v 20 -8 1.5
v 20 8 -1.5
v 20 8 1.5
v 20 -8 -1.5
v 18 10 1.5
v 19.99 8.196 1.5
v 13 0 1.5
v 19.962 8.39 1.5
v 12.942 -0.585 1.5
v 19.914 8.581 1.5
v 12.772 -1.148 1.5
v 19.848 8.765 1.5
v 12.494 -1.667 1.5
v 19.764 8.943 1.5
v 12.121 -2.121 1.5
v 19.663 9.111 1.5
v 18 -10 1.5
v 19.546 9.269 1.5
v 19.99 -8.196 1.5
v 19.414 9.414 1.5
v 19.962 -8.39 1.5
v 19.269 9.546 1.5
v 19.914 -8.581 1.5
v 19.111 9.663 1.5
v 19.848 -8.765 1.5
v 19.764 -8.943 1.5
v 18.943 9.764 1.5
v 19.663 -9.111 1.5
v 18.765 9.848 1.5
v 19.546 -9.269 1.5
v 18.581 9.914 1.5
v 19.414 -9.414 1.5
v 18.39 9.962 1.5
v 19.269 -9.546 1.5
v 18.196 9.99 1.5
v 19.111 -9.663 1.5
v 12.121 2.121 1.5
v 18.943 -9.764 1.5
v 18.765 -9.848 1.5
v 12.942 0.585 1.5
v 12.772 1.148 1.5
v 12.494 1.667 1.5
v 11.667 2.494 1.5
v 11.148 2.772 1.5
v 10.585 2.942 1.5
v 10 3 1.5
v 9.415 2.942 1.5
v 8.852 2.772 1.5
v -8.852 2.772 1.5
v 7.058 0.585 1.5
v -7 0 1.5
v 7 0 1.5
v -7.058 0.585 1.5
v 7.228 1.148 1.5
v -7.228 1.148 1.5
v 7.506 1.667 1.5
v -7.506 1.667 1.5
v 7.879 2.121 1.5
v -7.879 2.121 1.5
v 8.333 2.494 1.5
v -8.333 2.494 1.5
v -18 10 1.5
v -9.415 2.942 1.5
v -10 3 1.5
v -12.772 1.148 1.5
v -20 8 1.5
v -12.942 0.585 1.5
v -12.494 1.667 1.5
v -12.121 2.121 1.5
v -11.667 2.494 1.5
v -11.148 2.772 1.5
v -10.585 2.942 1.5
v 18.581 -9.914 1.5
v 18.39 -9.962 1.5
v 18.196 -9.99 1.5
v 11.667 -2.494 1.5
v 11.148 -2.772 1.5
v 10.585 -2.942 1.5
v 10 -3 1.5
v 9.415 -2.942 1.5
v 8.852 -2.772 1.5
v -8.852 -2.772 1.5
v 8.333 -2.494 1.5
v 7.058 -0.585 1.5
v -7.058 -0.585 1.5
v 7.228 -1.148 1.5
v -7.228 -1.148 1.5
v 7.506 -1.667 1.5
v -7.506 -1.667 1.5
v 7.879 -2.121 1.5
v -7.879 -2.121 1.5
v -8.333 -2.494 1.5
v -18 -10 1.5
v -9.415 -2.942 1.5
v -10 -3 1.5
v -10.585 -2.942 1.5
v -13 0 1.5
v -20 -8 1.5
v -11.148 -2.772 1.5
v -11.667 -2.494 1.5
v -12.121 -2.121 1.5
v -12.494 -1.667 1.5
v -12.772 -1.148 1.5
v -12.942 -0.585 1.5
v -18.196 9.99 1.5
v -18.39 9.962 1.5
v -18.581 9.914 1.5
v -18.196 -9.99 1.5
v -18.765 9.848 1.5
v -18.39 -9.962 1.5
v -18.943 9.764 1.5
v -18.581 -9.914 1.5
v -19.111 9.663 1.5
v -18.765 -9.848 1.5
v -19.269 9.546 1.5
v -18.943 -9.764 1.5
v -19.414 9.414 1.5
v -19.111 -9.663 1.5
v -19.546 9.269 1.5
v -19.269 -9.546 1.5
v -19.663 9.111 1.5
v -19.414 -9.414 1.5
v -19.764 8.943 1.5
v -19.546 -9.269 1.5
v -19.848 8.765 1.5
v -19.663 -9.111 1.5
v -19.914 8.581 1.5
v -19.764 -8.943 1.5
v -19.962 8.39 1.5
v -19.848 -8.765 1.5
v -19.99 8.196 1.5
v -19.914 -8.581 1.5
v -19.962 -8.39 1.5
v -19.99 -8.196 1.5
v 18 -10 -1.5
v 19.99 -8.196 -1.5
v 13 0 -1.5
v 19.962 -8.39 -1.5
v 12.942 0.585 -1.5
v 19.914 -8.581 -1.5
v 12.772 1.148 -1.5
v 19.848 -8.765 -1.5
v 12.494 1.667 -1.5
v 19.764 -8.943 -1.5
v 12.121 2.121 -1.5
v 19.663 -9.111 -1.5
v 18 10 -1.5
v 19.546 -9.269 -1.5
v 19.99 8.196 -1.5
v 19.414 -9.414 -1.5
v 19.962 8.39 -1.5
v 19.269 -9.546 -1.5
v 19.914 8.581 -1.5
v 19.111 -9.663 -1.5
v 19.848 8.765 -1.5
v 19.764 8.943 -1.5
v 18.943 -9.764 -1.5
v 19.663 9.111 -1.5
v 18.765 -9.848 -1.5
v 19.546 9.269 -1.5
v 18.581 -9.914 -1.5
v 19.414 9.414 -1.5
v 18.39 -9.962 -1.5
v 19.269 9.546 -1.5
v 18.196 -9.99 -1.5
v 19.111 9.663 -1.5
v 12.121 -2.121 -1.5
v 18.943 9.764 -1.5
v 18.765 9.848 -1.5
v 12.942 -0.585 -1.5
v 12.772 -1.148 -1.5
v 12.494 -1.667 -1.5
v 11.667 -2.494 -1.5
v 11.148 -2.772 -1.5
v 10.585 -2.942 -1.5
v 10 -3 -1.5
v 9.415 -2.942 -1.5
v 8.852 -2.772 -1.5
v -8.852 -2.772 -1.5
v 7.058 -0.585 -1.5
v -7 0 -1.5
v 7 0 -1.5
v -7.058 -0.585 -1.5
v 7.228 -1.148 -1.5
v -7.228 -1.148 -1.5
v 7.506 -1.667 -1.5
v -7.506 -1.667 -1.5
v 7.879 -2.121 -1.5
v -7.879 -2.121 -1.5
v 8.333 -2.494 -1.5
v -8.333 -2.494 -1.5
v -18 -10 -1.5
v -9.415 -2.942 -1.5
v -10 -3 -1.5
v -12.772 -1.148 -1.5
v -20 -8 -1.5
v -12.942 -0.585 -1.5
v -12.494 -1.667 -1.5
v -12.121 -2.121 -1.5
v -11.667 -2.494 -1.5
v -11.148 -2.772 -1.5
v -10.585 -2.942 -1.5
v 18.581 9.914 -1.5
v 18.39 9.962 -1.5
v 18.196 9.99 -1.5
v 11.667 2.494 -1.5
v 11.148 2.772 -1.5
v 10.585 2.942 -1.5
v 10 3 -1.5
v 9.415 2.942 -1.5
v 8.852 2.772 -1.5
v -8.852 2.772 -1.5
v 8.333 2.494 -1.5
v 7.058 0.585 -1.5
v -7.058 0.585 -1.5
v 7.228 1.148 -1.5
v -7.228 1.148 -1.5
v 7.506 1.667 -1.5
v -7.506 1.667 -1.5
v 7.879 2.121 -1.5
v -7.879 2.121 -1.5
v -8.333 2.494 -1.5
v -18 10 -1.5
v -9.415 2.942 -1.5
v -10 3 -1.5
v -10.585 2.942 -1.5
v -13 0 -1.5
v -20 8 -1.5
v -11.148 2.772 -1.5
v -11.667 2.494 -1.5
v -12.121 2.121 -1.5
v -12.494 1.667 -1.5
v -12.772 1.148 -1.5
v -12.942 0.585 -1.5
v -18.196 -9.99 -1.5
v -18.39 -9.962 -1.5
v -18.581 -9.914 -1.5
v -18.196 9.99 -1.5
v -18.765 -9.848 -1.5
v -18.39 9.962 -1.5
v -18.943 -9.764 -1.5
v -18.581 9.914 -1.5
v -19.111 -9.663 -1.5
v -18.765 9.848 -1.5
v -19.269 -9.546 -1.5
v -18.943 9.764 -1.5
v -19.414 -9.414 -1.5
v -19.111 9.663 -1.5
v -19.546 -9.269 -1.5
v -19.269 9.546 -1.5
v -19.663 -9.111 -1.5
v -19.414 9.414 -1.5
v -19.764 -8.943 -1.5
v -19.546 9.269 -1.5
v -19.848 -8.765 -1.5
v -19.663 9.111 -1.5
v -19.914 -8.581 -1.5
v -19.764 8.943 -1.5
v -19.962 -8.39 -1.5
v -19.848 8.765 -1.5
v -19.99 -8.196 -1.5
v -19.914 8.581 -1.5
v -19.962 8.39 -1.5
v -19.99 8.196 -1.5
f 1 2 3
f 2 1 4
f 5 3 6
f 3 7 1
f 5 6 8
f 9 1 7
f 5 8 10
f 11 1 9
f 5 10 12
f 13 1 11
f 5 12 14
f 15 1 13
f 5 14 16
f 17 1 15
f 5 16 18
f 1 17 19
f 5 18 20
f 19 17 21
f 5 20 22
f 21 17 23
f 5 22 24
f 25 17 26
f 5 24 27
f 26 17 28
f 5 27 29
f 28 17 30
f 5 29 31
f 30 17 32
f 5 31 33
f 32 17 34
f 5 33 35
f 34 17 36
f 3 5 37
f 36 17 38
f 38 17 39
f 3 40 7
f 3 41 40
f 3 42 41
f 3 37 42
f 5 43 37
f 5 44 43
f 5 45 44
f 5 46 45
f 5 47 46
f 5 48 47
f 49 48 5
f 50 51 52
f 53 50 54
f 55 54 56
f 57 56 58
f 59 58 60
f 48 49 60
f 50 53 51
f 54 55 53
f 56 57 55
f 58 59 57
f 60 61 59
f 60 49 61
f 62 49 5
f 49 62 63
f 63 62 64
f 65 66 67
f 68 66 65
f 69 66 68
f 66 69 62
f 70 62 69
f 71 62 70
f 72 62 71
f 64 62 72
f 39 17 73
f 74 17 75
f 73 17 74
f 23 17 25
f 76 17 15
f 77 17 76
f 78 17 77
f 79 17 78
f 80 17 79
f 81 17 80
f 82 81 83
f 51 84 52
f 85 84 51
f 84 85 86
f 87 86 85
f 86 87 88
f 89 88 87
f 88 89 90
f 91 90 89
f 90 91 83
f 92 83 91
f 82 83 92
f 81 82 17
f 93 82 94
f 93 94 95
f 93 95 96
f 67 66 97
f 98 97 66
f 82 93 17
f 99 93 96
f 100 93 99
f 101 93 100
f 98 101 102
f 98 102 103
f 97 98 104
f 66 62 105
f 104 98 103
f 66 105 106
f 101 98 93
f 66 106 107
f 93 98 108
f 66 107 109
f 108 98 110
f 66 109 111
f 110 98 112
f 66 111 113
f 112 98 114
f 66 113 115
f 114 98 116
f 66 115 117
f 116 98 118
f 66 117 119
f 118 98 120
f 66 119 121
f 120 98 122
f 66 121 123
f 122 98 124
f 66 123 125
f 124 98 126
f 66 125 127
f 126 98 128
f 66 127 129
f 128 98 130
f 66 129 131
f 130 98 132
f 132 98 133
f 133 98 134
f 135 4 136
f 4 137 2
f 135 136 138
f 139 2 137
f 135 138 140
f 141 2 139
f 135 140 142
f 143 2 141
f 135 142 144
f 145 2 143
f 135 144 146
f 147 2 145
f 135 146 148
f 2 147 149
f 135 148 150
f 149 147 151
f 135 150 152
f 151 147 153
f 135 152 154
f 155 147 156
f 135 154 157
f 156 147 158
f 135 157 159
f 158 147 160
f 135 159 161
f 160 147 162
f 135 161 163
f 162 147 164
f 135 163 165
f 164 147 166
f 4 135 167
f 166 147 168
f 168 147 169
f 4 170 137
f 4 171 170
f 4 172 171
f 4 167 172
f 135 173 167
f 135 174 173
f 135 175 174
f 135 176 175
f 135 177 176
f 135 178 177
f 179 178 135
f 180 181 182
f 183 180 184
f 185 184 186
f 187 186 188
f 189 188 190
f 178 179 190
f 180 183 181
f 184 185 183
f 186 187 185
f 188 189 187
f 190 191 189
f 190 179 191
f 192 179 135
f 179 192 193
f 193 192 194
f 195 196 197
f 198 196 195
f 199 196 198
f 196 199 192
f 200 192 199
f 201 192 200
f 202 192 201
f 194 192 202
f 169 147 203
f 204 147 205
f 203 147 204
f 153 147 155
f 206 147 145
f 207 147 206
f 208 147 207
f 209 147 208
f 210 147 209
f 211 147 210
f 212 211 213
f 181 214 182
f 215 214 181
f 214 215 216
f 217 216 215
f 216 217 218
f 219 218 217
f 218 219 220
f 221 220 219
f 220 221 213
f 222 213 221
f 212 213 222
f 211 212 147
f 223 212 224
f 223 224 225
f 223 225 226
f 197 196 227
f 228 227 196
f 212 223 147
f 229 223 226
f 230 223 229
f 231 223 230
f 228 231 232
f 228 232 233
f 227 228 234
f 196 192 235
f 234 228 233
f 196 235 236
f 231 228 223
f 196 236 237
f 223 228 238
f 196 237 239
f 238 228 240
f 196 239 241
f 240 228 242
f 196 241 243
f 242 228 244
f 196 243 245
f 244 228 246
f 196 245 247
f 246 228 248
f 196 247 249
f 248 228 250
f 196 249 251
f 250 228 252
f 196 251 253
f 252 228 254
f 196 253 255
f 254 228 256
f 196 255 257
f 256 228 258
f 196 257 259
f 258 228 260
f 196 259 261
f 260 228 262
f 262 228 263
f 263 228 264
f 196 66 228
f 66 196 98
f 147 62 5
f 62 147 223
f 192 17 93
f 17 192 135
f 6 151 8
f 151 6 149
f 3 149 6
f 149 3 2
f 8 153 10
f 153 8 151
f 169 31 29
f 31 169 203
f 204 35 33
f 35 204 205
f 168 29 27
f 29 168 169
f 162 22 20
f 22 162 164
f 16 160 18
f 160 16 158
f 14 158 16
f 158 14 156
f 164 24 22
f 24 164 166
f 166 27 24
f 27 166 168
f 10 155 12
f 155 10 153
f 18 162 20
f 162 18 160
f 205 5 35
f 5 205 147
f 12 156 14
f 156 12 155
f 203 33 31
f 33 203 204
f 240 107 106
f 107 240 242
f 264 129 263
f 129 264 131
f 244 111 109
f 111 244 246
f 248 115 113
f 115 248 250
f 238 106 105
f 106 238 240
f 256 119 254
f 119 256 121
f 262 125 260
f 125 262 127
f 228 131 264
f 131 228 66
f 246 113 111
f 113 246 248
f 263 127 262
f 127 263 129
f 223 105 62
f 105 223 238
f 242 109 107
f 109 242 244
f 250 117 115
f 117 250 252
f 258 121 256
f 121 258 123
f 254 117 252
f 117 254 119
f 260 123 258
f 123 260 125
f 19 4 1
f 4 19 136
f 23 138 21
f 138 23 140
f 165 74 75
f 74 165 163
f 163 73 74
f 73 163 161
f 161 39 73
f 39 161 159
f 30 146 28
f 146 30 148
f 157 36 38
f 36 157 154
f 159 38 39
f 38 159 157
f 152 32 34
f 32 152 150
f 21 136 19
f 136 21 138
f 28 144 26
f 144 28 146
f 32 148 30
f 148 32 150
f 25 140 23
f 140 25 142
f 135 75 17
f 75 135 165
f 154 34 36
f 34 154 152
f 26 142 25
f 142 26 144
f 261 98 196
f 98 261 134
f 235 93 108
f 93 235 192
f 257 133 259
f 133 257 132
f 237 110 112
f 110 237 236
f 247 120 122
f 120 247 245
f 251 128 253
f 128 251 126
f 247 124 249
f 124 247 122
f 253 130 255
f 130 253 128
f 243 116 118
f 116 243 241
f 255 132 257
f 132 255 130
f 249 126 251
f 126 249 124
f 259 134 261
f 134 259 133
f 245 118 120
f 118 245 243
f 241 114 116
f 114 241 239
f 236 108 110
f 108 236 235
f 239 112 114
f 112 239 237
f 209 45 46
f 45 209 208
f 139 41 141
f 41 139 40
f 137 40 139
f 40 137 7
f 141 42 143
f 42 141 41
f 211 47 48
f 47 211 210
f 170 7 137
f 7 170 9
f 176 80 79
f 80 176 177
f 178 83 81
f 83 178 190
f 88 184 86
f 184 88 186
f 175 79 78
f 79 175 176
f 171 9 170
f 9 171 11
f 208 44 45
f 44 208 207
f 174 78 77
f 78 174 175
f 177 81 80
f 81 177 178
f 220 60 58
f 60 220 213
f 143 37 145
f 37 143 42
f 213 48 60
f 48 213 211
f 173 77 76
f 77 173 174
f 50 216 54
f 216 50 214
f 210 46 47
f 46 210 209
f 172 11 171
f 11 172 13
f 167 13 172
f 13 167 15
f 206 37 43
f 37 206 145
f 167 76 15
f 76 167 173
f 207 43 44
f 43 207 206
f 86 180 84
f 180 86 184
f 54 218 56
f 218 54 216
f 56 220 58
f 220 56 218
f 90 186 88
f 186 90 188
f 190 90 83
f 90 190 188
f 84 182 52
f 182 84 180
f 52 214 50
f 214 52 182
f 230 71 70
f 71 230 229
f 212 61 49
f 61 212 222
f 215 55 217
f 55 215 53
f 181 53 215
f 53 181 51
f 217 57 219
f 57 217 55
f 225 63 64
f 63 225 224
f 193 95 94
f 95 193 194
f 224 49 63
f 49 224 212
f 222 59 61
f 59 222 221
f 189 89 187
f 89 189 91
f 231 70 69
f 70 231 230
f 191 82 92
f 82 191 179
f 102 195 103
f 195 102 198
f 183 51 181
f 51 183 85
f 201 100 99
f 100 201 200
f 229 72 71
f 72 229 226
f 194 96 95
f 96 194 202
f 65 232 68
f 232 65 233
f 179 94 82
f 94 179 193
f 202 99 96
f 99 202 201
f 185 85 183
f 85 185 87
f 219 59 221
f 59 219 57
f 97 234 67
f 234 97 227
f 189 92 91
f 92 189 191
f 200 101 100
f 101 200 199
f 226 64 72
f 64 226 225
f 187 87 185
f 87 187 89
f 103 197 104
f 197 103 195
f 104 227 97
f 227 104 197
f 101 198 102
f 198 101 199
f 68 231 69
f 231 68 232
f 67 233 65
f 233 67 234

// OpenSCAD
difference()
{
    rounded_box(40,20,3,2,$fn=64);
    
    translate([10,0,0])
    cylinder(d=6,h=7,$fn=32,center=true);
    
    translate([-10,0,0])
    cylinder(d=6,h=7,$fn=32,center=true);
}

module rounded_box(x,y,z,radius,$fn=$fn)
{
    union()
    {
        cube([x,y-2*radius,z],center=true);
        cube([x-2*radius,y,z],center=true);
        
        translate([(x/2-radius),(y/2-radius),0])
        cylinder(r=radius,h=z,center=true);
        
        translate([-(x/2-radius),(y/2-radius),0])
        cylinder(r=radius,h=z,center=true);
        
        translate([(x/2-radius),-(y/2-radius),0])
        cylinder(r=radius,h=z,center=true);
        
        translate([-(x/2-radius),-(y/2-radius),0])
        cylinder(r=radius,h=z,center=true);
    }
}
